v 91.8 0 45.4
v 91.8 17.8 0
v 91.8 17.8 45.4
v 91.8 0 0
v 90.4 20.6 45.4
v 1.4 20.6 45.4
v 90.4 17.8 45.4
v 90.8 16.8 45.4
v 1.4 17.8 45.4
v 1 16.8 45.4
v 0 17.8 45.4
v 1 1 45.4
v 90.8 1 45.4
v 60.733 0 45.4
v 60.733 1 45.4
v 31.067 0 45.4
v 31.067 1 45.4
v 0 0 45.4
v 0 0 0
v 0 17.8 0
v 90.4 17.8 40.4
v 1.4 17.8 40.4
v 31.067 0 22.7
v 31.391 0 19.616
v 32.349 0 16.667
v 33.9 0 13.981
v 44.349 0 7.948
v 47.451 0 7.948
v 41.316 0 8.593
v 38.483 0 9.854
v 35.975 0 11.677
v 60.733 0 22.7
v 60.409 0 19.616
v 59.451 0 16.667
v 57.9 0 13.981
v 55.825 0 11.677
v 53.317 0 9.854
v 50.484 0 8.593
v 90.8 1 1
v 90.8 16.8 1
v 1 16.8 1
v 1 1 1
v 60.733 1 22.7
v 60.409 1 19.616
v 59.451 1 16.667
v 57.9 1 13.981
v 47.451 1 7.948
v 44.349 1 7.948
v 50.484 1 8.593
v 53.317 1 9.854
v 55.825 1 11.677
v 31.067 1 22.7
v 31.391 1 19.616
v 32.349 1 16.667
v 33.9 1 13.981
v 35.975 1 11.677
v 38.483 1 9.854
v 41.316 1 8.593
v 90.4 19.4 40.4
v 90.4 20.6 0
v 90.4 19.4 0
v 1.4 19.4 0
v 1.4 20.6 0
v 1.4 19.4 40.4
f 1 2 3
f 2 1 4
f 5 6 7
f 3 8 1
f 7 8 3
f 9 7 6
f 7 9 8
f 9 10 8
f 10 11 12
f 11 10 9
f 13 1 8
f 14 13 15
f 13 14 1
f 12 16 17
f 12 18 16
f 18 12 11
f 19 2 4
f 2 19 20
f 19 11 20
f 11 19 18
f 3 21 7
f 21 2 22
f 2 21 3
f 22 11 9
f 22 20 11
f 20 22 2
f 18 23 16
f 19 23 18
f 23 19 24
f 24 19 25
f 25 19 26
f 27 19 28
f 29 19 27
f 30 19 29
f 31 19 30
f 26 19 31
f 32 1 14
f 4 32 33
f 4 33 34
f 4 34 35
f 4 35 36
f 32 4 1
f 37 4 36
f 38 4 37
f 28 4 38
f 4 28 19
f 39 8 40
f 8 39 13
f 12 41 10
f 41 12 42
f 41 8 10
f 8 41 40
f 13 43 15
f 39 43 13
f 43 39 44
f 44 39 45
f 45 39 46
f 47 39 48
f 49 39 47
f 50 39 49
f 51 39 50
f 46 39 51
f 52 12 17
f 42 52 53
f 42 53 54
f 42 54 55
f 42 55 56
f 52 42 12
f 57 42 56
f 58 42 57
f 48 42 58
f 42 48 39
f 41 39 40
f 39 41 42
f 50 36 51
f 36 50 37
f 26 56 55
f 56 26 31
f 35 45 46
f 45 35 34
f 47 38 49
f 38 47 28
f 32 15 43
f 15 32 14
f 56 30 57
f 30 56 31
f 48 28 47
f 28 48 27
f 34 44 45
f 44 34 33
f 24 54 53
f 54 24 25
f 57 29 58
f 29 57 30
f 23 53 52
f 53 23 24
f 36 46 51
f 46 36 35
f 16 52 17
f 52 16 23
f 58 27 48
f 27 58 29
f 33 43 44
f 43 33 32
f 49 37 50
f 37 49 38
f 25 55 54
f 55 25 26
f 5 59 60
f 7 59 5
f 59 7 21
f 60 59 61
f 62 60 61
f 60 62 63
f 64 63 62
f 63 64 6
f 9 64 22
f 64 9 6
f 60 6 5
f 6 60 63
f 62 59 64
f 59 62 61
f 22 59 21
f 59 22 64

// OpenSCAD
// file: lib_boxes5.scad
// boxes5.scad

/**
x1 = width
y1 = depth
z1 = height
r1 = radius of corners
*/
module rounded_rectangle(x1, y1, z1, r1) {
    if (r1 > 0.00001) { // deal with rounding errors 
		translate([r1, r1, 0]) {
			minkowski () {
				cube([x1-2*r1, y1-2*r1, z1/2]);
				cylinder(z1/2, r1, r1);
			}
		}
	} else {
		cube([x1, y1, z1]);
	}
}

/**
x1 = width
y1 = depth
z1 = height
r1 = radius of corners
d1 = thickness
*/
module rounded_ring(x1, y1, z1, r1, d1) {
	difference () {
		rounded_rectangle(x1, y1, z1, r1);
		translate([d1, d1, 0]) {
			rounded_rectangle(x1-2*d1, y1-2*d1, z1+0.001, r1-d1);
		}
	}
}

/**
x1 = width
y1 = depth
z1 = height
r1 = radius of corners
d1 = thickness
*/
module open_box(x1, y1, z1, r1, d1) {
	rounded_rectangle(x1, y1, d1, r1);
	rounded_ring(x1, y1, z1, r1, d1);
}

/**
Bottom of a friction fit box
x1 = width
y1 = depth
z1 = height
r1 = radius of corners
d1 = thickness
z2 = friction
d2 = tolerance
*/
module box_bottom(x1, y1, z1, r1, d1, z2, d2) {
	x2 = d1/2+d2/2;
	y2 = d1/2+d2/2;
	x3 = x1-2*x2;
	y3 = y1-2*y2;
	r3 = max(r1-x2, 0);
	d3 = d1/2-d2/2;
	mm = floor(min(x1, y1)/10);

	difference() {
		union() {
			open_box(x1, y1, z1-z2, r1, d1);
			translate([x2, y2, 0]) {
				rounded_ring(x3, y3, z1-d2, r3, d3);
			}
		}
		*for (ii = [1 : mm]) {
			xx1 = 5*ii;
			xx2 = x1-10*ii;
			yy1 = 5*ii;
			yy2 = y1-10*ii;
			rr2 = r1-5*ii;
			translate([xx1, yy1, 0]) {
				rounded_ring(xx2, yy2, 0.65, rr2, 3);
			}
		}
	}
}

/**
Top of a friction fit box.
x1 = width
y1 = depth
z1 = height
r1 = radius of corners
d1 = thickness
z2 = friction
d2 = tolerance
*/
module box_top(x1, y1, z1, r1, d1, z2, d2) {
	x2 = d1/2+d2;
	y2 = d1/2+d2;
	x3 = x1-2*x2;
	y3 = y1-2*y2;
	z3 = z1+z2-d2;
	r3 = max(r1-x2, 0);
	d3 = d1/2-d2/2;
	mm = floor(min(x1, y1)/10);
	
	difference() {
		union() {
			open_box(x1, y1, z1-z2, r1, d1);
			rounded_ring(x1, y1, z1-d2, r1, d3);
		}

		*for (ii = [1 : mm]) {
			xx1 = 5*ii;
			xx2 = x1-10*ii;
			yy1 = 5*ii;
			yy2 = y1-10*ii;
			rr2 = r1-5*ii;
			translate([xx1, yy1, 0]) {
				rounded_ring(xx2, yy2, 0.65, rr2, 3);
			}
		}
	}
}

/**
x1 = width
y1 = depth
z1 = height
r1 = radius of corners
d1 = thickness
z2 = friction
d2 = tolerance
r2 = radius of fingers
*/
module fingers(x1, y1, z1, r1, d1, z2, d2, r2) {
	zz = max(z1, r2+d2);
    translate([0, y1/2, zz]) {
		rotate([0, 90, 0]) {
			translate([0, 0, -1]) {
				cylinder(x1+2, r2, r2);
			}
		}
	}
}

/**
x1 = width
y1 = depth
z1 = height
d1 = thickness
z2 = friction
d2 = tolerance
*/
module pimples(x1, y1, z1, d1, z2, d2) {
	translate([x1/2, (d1/2), z1-(z2/2)]) {
		sphere(d1/2);
	}
	translate([x1/2, y1-(d1/2), z1-(z2/2)]) {
		sphere(d1/2);
	}
}
// main file
use <lib_boxes5.scad>
//$fn = 30;

wall_thickness = 1;
card_width = 89; // business cards are 89 mm wide
card_height = 54; // credit cards are 54 mm high
size = 15;
exposure = 10;
tolerance = 0.40;

box_x = 2*wall_thickness+2*tolerance+card_width;
box_y = 2*wall_thickness+2*tolerance+size;
box_z = wall_thickness+tolerance+card_height-exposure;

difference() {
	open_box(box_x, box_y, box_z, 0, wall_thickness);
	translate([box_x/2, box_y/2+0.001, box_z/2]) {
		rotate([90, 0, 0]) {
			hull() {
				cylinder(box_y/2+0.001, card_width/6, card_width/6);
				translate([0, box_z, 0]) {
					cylinder(box_y/2+0.001, card_width/6, card_width/6);
				}
			}
		}
	}
}

translate([(box_x-card_width)/2, box_y+1.6, 0]) {
	cube([card_width, 1.2, box_z]);
}

translate([(box_x-card_width)/2, box_y, box_z-5]) {
	cube([card_width, 1.6, 5]);
}
